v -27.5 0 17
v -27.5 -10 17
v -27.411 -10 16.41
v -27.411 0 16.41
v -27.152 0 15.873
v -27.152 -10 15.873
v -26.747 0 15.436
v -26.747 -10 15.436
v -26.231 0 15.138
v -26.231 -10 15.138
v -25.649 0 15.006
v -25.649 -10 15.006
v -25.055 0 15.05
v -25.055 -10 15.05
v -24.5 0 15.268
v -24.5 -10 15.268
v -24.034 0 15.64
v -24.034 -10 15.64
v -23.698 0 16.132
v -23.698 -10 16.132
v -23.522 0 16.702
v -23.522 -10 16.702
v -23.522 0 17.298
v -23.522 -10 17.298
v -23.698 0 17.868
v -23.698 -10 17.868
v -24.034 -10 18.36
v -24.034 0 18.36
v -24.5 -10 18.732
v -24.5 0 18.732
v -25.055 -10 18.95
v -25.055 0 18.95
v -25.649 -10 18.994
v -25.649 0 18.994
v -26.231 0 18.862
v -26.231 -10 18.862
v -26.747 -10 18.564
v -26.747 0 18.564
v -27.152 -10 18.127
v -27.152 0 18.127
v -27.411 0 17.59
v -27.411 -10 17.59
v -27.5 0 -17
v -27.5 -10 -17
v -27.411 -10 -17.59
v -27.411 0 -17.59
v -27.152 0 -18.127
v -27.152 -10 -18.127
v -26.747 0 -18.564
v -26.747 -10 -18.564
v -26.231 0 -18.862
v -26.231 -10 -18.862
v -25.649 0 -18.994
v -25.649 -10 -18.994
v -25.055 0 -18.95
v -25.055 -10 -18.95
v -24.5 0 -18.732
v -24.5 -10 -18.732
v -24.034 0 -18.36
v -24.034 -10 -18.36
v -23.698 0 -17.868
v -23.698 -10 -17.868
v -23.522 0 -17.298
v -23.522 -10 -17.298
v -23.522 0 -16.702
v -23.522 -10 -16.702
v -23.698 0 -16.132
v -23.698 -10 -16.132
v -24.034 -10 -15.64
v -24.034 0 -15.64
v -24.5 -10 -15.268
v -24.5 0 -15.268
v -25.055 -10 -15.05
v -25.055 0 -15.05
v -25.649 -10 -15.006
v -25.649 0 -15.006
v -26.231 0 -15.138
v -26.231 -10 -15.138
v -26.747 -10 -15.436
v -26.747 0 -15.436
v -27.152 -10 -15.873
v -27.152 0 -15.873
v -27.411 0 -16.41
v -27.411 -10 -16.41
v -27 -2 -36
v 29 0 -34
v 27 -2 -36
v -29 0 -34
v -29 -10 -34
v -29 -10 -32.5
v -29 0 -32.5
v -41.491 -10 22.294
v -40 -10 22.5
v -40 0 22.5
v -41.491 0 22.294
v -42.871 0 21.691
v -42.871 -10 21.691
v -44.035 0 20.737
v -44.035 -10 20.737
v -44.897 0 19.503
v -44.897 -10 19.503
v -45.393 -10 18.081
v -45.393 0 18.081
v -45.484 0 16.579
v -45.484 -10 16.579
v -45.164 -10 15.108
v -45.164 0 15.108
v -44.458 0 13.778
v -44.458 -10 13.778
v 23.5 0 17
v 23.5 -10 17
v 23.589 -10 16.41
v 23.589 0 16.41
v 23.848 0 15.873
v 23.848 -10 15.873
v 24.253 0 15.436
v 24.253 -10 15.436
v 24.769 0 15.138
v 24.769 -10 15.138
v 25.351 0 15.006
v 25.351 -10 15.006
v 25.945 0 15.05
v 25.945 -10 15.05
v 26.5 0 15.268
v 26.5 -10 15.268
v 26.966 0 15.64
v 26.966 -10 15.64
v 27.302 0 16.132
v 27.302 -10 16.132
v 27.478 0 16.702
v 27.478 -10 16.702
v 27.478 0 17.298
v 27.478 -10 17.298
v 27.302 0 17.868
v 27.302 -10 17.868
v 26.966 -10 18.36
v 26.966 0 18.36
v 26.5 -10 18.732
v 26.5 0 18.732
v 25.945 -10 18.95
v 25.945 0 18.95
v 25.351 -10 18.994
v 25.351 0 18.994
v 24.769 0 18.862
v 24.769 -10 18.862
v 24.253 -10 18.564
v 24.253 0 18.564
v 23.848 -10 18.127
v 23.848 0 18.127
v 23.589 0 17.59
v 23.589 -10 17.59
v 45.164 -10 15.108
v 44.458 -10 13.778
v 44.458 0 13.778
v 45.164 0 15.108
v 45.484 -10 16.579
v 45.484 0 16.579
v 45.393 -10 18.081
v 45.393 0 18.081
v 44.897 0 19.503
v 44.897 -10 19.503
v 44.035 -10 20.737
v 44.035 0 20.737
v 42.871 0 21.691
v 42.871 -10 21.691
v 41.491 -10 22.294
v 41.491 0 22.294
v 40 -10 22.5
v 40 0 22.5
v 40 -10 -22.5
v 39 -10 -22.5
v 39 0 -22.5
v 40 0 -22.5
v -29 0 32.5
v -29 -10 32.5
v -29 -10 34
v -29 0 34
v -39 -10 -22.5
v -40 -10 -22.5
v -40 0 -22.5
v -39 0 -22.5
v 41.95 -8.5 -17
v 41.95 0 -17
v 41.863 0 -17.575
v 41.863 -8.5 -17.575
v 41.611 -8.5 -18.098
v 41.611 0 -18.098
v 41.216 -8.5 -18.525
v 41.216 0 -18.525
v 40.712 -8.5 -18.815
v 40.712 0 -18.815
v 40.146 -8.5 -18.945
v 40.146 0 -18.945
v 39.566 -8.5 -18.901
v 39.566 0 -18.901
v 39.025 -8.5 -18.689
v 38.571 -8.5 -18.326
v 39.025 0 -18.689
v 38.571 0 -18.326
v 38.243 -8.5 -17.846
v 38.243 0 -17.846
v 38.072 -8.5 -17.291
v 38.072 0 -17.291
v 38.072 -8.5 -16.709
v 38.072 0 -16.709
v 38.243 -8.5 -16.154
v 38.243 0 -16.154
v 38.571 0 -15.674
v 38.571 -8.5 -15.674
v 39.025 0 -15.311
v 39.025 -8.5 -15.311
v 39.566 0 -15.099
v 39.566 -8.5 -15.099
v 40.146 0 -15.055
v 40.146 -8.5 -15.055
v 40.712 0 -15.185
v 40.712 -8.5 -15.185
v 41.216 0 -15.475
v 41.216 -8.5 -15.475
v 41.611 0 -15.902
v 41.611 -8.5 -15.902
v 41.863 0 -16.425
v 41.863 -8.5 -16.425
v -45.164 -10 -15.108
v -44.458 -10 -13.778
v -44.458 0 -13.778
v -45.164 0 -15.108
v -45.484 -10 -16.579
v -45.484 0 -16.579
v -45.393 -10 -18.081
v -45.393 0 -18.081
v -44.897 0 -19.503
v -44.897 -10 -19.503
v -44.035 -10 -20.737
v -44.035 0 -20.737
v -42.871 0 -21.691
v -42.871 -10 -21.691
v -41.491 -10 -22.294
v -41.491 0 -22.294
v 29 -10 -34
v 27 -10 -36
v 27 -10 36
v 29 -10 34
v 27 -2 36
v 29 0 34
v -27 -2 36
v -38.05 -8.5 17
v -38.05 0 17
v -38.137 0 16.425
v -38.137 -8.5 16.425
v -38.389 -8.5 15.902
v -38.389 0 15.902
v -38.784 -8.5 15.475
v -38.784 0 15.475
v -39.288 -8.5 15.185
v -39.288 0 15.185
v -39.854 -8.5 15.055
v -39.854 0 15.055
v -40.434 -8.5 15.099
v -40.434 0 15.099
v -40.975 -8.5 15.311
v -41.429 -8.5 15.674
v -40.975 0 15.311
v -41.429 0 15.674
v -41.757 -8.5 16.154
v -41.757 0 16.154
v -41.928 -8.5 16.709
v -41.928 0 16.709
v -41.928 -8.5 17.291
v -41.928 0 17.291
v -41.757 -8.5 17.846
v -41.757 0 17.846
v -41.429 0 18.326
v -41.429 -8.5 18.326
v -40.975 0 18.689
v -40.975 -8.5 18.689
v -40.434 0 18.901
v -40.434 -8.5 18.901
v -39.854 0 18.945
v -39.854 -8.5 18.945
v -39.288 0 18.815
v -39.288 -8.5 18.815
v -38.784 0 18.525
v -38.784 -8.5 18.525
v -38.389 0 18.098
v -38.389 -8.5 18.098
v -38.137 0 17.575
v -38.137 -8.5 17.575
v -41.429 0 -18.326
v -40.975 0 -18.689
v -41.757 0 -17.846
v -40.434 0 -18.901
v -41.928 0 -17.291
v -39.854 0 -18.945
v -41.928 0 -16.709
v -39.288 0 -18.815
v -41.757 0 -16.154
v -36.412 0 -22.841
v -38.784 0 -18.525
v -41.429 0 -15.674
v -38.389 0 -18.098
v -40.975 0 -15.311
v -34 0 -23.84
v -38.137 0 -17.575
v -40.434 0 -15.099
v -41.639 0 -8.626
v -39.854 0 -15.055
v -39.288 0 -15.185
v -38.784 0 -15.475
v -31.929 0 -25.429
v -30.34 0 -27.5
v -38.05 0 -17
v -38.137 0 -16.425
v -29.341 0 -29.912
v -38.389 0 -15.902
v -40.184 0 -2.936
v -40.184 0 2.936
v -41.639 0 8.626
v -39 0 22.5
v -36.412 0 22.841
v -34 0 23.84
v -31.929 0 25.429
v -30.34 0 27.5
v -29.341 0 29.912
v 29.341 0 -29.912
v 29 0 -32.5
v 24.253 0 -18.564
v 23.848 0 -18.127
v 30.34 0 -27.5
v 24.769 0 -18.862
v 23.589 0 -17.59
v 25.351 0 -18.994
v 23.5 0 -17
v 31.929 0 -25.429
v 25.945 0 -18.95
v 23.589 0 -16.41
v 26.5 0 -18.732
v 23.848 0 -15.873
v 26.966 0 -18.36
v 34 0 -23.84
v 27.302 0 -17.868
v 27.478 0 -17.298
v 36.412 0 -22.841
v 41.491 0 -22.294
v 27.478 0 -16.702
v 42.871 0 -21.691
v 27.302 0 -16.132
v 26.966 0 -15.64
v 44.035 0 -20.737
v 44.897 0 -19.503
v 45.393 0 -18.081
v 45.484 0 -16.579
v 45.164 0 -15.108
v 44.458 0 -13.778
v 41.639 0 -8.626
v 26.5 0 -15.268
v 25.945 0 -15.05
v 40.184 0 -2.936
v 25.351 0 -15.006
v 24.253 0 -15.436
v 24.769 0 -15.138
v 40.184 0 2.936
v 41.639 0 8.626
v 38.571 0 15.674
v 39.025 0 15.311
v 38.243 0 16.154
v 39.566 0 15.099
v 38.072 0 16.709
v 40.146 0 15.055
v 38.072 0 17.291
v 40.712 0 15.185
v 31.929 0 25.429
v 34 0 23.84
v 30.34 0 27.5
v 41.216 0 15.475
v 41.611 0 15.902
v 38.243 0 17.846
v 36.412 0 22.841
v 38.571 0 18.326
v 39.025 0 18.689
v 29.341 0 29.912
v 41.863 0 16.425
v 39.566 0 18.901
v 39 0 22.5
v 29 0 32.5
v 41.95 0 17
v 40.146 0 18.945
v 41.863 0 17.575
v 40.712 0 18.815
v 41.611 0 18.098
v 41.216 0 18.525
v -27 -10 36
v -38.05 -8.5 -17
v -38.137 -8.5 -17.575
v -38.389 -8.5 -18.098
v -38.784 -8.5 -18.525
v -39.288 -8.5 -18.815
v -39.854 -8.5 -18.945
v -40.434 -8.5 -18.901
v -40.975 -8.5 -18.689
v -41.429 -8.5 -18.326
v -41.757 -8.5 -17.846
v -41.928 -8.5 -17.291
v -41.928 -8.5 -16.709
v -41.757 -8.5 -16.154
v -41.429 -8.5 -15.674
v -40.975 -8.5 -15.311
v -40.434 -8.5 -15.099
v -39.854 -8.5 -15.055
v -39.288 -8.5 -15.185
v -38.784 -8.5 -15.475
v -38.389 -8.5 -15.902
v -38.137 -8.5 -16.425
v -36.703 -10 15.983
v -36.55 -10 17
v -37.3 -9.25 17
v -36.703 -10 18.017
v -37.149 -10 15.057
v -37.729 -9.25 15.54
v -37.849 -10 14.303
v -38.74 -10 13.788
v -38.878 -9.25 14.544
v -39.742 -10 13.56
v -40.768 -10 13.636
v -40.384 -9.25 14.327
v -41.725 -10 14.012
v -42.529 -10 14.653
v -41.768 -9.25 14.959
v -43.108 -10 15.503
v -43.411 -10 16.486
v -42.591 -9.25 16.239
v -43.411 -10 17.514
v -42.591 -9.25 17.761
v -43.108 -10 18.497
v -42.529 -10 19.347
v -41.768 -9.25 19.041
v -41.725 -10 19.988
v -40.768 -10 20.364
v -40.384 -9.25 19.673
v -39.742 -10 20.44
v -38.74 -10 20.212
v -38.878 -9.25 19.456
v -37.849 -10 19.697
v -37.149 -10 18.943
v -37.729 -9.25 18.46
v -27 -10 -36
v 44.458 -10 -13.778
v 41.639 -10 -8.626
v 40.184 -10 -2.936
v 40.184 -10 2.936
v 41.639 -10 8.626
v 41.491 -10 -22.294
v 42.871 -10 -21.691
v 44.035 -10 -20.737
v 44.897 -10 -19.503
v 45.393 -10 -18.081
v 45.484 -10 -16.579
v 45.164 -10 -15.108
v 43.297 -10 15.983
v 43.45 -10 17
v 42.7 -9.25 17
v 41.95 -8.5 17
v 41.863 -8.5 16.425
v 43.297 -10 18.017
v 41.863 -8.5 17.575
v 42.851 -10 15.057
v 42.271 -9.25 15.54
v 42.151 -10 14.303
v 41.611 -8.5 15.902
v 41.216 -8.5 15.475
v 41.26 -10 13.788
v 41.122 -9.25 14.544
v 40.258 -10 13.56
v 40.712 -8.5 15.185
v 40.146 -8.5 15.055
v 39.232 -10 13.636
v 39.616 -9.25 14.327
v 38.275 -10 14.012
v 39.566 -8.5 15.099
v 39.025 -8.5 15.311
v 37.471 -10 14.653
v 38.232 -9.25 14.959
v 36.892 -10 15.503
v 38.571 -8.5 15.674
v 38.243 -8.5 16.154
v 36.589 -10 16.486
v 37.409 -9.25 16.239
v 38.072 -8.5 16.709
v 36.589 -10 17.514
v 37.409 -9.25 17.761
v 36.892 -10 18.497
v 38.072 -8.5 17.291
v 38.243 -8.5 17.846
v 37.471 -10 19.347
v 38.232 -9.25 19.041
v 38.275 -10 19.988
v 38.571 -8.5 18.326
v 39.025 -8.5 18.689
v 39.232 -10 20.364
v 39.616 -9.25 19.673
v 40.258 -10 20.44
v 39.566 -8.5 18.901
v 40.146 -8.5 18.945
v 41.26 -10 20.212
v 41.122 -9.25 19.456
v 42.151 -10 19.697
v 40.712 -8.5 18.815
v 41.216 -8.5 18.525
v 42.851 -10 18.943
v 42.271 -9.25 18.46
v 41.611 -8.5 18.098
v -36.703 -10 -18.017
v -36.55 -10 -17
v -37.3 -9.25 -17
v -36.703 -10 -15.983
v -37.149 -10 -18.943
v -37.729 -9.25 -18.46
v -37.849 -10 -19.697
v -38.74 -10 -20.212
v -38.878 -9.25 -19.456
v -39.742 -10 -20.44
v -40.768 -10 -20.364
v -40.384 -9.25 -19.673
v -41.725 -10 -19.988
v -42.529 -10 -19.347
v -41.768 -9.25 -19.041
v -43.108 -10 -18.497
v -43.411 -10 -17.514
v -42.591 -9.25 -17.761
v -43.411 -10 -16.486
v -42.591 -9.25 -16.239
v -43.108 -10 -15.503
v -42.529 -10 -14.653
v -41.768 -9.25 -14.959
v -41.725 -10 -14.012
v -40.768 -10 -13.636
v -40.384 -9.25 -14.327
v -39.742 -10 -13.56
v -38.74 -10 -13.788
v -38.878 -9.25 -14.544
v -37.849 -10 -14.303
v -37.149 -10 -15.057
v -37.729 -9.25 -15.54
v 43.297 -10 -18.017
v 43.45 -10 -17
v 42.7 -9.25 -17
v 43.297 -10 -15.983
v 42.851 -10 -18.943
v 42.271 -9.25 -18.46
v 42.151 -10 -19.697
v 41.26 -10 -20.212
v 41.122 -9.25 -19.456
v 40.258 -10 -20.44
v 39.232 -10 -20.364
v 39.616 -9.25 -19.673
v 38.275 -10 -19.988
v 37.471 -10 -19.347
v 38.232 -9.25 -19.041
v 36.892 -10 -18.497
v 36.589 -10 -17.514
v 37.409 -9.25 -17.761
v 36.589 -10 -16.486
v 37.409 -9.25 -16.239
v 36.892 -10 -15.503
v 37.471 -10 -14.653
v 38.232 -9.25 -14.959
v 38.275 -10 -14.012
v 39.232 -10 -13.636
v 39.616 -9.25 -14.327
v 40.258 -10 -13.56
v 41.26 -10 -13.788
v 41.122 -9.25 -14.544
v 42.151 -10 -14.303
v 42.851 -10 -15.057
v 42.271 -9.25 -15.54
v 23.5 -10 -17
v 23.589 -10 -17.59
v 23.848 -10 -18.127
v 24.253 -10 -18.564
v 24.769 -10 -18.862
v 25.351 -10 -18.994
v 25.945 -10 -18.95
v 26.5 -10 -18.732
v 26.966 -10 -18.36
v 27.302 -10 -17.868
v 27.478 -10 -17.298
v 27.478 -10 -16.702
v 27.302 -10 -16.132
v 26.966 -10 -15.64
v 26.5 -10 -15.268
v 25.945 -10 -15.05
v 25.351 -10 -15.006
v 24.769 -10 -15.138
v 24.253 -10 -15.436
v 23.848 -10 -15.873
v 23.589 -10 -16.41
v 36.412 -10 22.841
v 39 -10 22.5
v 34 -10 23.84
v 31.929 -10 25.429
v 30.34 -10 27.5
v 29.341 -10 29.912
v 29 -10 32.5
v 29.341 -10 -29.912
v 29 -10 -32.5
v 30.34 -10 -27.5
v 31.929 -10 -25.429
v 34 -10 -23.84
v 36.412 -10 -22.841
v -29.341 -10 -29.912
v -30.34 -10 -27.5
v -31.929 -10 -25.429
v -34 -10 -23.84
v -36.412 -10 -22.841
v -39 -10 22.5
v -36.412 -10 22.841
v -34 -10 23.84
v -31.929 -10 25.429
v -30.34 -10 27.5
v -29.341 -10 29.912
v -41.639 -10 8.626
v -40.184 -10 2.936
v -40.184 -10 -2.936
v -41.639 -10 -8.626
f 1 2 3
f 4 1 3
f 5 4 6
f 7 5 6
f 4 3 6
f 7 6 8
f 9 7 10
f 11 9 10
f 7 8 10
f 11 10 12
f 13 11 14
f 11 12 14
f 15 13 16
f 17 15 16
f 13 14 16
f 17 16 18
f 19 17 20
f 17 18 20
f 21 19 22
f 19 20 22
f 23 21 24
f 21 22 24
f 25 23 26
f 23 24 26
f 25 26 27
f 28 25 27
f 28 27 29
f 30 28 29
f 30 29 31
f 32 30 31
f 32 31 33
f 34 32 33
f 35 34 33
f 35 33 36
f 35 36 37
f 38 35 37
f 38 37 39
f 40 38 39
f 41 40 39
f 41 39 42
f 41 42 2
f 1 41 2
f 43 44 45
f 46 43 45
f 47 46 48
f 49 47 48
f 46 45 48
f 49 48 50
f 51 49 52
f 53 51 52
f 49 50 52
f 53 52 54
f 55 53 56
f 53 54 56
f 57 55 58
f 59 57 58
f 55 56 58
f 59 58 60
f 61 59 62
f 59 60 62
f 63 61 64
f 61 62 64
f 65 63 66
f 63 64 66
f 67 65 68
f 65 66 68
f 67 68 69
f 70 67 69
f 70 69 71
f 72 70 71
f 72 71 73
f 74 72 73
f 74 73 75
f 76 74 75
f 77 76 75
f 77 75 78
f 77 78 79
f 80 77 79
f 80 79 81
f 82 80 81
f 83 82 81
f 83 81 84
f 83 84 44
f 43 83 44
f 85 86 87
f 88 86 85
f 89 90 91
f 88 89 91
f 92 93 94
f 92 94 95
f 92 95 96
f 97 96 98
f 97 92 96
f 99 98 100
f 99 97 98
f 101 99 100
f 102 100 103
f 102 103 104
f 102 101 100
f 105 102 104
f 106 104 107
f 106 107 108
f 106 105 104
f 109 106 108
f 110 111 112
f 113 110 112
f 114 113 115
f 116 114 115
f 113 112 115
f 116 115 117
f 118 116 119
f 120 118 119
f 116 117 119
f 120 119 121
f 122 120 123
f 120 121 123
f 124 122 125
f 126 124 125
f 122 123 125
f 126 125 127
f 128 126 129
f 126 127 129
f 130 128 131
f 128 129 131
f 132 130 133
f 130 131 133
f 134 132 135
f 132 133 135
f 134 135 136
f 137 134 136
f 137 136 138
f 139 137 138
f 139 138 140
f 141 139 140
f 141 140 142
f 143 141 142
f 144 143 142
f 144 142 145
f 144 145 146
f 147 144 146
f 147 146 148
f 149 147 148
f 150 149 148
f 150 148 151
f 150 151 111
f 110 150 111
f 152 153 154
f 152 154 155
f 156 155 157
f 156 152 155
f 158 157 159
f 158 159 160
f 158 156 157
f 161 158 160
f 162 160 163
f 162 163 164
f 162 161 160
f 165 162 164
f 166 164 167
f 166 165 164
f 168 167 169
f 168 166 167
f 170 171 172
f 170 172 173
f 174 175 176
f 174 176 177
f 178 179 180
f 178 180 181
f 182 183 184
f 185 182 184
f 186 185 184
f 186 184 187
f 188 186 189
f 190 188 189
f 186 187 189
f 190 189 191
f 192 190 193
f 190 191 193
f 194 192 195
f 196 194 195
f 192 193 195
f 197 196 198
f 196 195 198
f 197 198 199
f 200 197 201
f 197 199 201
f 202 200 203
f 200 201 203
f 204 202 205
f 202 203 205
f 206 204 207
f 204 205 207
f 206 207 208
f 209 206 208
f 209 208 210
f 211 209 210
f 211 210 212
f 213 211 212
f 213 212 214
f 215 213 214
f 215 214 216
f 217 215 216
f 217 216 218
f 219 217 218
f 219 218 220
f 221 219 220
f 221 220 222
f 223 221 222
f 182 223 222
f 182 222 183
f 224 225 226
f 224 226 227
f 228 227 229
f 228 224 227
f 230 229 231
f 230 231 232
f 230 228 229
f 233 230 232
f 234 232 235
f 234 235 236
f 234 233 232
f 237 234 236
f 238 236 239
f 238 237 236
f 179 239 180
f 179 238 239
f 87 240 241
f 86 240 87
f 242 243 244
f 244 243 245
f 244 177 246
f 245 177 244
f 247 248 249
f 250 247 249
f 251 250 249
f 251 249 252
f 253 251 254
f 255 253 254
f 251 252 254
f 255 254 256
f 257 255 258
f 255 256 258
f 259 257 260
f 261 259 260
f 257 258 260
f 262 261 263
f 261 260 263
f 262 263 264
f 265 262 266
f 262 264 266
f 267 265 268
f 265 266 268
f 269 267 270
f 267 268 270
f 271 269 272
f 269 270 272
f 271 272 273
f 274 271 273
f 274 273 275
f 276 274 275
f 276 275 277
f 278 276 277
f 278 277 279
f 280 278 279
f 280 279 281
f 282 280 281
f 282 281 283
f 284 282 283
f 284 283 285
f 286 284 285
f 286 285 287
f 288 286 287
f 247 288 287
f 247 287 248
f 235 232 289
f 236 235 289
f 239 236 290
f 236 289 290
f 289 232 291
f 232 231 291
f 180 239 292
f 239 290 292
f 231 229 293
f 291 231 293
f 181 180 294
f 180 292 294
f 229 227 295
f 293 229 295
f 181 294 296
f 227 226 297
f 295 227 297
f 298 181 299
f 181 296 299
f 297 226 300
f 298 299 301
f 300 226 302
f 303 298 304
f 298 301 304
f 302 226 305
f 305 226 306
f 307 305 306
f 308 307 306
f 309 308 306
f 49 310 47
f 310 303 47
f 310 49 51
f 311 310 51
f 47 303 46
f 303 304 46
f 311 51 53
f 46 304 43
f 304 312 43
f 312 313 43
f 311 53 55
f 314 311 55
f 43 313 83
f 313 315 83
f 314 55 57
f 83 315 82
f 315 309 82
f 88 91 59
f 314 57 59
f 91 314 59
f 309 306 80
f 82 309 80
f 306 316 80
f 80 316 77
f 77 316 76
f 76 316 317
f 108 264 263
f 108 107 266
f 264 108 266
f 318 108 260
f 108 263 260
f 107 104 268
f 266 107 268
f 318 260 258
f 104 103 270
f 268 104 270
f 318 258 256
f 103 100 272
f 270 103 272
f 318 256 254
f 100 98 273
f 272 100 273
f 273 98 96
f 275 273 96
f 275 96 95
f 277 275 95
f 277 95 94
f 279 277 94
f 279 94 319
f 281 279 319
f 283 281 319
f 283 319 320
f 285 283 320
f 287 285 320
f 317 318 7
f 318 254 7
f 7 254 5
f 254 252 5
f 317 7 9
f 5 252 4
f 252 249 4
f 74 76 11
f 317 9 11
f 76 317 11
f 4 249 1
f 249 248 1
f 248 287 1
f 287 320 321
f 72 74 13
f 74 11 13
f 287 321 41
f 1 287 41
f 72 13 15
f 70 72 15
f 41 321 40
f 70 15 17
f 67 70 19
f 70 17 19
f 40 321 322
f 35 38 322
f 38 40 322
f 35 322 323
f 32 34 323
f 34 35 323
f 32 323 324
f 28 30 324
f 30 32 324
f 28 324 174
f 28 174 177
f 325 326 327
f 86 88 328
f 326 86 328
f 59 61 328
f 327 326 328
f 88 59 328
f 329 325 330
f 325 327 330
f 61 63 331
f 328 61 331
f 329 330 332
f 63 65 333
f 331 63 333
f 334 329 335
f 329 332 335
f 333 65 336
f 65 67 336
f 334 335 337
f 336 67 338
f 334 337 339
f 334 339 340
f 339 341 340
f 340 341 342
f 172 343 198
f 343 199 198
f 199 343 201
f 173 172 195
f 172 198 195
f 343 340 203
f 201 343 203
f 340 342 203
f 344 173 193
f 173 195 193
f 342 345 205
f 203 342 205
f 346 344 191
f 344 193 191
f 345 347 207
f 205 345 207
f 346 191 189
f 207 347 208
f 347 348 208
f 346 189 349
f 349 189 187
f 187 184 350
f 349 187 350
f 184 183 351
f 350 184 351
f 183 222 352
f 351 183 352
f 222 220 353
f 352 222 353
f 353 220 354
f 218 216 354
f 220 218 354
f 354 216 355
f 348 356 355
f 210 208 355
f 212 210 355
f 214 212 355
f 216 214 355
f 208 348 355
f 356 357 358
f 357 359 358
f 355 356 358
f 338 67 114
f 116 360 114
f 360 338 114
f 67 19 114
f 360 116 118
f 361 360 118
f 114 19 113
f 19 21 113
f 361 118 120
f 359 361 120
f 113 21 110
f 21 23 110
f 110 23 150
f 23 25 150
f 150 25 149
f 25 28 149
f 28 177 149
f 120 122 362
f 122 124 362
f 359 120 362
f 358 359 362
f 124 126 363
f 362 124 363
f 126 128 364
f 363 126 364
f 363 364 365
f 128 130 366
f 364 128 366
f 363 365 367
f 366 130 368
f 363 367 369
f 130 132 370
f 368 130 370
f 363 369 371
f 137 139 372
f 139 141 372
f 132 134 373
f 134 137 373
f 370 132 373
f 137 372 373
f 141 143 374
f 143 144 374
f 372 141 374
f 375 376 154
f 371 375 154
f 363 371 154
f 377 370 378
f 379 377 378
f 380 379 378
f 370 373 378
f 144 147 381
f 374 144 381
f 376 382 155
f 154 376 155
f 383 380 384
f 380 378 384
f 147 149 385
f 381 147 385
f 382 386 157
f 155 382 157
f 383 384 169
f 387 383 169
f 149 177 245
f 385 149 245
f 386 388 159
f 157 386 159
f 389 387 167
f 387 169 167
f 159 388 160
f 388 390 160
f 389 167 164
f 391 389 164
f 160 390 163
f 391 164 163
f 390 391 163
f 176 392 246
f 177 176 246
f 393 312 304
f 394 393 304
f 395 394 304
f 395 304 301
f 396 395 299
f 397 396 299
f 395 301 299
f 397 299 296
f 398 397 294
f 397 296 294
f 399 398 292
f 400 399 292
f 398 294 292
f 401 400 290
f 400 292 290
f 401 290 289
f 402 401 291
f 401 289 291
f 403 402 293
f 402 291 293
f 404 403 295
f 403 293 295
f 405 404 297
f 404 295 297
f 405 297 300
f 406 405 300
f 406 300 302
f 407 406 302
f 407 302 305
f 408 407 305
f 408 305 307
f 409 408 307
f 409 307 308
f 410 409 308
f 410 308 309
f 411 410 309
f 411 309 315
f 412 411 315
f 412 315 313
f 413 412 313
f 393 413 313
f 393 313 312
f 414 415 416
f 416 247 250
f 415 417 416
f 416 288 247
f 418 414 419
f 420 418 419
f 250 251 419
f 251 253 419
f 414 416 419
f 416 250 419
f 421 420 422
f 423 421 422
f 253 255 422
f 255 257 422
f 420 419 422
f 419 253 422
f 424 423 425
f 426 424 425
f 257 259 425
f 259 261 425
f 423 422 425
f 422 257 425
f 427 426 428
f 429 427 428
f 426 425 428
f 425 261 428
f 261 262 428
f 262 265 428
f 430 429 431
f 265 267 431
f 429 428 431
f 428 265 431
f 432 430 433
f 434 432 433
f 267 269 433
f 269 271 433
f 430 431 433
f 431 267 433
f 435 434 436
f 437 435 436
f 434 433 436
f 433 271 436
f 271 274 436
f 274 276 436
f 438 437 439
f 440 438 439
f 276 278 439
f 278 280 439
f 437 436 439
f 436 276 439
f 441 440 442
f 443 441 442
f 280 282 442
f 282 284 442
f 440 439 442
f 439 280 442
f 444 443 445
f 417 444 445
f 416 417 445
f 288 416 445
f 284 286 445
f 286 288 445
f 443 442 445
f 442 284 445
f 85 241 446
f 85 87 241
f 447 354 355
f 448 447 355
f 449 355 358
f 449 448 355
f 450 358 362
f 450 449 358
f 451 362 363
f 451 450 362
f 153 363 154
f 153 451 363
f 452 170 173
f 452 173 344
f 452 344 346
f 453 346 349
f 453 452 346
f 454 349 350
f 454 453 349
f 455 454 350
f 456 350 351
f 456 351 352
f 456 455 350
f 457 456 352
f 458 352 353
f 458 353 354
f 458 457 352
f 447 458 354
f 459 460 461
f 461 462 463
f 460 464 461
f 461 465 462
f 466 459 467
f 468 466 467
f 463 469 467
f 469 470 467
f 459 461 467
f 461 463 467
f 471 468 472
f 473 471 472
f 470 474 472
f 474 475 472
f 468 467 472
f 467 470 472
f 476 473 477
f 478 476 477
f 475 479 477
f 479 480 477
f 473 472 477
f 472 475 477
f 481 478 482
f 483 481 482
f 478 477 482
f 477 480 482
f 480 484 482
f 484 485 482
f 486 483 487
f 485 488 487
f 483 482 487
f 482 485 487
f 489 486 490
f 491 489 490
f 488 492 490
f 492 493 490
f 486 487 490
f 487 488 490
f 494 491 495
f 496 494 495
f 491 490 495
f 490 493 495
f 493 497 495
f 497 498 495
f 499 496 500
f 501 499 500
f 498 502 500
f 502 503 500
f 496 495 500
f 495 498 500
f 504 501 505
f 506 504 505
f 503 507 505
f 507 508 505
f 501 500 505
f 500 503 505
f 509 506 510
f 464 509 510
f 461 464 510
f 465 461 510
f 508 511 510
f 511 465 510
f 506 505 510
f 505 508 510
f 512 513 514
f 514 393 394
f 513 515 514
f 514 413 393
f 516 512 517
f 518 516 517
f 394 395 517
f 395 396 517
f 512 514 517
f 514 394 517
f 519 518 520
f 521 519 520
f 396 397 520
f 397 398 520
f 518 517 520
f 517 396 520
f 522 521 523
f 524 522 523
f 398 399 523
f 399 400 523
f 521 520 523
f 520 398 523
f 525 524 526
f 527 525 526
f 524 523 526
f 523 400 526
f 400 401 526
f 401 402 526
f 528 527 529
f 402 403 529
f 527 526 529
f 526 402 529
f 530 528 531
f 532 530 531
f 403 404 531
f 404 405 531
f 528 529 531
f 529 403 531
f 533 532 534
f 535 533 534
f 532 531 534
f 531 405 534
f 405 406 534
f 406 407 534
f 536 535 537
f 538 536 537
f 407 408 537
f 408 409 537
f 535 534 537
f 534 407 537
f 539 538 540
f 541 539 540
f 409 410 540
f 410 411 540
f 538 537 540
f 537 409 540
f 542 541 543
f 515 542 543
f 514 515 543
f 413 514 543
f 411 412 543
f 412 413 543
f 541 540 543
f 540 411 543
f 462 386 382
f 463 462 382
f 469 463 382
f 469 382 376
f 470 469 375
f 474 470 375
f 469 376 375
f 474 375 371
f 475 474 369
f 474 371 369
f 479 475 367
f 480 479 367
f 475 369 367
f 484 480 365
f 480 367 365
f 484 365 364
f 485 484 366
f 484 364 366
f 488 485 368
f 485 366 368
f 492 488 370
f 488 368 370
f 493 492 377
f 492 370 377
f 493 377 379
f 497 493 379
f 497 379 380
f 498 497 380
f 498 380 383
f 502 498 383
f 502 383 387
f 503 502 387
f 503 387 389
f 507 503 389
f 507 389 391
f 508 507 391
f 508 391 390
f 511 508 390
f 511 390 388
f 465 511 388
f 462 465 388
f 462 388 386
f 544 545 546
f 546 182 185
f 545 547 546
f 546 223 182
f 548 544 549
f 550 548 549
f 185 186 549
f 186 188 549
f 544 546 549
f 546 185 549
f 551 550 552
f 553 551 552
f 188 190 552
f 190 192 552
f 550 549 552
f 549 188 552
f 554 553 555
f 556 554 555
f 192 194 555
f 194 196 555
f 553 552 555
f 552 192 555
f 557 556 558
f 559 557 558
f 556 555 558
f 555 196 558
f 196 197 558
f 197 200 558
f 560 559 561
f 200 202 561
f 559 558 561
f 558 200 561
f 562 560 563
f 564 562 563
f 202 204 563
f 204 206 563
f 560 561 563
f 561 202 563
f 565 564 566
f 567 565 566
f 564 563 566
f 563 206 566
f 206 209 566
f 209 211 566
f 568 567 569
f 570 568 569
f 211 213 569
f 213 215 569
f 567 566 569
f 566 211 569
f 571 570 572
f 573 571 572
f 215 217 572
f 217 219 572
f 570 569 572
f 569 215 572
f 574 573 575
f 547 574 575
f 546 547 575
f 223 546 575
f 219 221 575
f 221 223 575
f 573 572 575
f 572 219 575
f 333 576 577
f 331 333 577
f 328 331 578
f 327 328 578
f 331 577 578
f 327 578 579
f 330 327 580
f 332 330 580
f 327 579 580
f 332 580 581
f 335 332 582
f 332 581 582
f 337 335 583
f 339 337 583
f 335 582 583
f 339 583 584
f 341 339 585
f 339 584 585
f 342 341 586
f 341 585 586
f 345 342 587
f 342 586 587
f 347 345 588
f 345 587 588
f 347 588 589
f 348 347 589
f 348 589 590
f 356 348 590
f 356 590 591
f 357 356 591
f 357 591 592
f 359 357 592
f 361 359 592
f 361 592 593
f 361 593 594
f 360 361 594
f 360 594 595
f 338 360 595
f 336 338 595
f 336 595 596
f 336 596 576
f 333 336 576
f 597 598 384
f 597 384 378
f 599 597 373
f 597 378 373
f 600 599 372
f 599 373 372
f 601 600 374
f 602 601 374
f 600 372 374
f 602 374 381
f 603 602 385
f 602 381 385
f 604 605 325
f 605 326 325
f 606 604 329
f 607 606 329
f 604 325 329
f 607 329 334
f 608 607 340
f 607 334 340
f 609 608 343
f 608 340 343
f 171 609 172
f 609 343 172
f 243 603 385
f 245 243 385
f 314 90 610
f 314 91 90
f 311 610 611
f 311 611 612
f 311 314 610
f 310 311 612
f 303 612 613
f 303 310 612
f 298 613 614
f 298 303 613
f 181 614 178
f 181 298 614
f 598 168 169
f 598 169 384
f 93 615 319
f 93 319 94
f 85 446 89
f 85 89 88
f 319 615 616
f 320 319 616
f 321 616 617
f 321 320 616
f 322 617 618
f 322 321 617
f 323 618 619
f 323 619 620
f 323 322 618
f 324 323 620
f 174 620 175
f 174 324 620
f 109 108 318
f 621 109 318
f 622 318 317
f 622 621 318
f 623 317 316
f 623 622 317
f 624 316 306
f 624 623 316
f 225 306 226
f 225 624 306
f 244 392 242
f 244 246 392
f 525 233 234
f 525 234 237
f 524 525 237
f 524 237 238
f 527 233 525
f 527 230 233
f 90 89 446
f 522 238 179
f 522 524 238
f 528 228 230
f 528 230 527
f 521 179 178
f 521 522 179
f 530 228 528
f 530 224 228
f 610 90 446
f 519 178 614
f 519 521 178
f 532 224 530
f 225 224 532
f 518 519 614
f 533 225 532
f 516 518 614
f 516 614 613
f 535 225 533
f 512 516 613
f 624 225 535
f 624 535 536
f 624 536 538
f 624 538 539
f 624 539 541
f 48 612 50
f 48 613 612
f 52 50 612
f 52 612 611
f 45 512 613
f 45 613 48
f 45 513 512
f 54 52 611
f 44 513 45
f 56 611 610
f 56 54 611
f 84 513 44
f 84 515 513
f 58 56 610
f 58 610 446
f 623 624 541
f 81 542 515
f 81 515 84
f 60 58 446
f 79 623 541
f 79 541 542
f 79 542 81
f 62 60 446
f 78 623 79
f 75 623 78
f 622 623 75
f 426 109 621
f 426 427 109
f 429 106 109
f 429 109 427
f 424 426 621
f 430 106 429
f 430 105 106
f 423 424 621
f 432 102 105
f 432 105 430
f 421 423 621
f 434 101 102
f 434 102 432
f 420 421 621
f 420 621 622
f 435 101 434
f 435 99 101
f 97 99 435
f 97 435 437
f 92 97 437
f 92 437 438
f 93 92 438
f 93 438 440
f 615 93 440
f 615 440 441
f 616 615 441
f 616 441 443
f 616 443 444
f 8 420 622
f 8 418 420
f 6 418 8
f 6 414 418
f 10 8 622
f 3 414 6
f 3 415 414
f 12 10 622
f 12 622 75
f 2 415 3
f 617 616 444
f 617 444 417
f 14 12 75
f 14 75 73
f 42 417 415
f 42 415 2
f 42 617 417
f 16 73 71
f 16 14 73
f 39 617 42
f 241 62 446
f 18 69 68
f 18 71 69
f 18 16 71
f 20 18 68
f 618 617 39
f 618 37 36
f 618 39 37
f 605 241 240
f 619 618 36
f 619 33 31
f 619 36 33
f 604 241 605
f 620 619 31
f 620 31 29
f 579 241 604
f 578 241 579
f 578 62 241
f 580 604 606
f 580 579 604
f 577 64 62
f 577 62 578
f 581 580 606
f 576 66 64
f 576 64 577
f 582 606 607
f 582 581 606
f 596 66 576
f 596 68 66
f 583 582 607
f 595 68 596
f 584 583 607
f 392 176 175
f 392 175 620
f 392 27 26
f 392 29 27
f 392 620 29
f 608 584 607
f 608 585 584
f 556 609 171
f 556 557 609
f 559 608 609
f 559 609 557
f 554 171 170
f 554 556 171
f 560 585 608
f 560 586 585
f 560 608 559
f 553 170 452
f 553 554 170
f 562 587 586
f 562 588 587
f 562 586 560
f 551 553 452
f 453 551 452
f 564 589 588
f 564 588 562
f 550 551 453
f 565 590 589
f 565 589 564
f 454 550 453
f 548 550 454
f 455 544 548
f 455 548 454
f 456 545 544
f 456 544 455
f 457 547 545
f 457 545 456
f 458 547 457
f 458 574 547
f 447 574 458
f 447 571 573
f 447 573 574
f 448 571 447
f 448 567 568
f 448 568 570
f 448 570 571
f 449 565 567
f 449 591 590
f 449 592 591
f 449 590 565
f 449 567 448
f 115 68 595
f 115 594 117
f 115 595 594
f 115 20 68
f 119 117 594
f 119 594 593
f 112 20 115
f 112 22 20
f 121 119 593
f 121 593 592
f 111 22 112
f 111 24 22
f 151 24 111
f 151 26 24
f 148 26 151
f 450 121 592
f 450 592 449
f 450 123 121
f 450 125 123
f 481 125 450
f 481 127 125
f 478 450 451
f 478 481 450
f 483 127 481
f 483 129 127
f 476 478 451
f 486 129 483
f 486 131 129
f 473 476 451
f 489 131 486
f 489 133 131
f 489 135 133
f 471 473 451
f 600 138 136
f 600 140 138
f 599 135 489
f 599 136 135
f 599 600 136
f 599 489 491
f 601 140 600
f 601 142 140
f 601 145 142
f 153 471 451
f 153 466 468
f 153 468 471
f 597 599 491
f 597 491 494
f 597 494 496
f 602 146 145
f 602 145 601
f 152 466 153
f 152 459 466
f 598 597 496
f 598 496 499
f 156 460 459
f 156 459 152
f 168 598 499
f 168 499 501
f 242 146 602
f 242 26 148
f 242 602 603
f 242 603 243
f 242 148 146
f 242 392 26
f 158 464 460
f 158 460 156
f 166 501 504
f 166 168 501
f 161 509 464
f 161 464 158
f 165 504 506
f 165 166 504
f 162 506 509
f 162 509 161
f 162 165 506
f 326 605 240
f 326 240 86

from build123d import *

# Parameters (mm, degrees)
BOSS_EXTRUDE1_DEPTH        = 10
SKETCH2_W                  = 58
SKETCH2_H                  = 10
BOSS_EXTRUDE2_DEPTH        = 13.5
SKETCH3_W                  = 58
SKETCH3_H                  = 10
BOSS_EXTRUDE3_DEPTH        = 13.5
F_4_0_4_DIAMETER_HOLE1_D   = 4
F_3_9_3_9_DIAMETER_HOLE1_D = 3.9
CHAMFER1_SIZE              = 1.5
CHAMFER2_SIZE              = 2
FILLET1_R                  = 10


with BuildPart() as part:
    # Sketch1 → Boss-Extrude1 (new body)
    with BuildSketch(Plane.XZ.offset(10)):
        with BuildLine():
            Line((-40, -22.5), (40, -22.5))
            ThreePointArc((40, -22.5), (44.897390752, -19.503110829), (44.457713391, -13.778386844))
            ThreePointArc((44.457713391, -13.778386844), (40, 0), (44.457713391, 13.778386844))
            ThreePointArc((44.457713391, 13.778386844), (44.897390752, 19.503110829), (40, 22.5))
            Line((40, 22.5), (-40, 22.5))
            ThreePointArc((-40, 22.5), (-44.897390752, 19.503110829), (-44.457713391, 13.778386844))
            ThreePointArc((-44.457713391, 13.778386844), (-40, 0), (-44.457713391, -13.778386844))
            ThreePointArc((-44.457713391, -13.778386844), (-44.897390752, -19.503110829), (-40, -22.5))
        make_face()
    extrude(amount=-BOSS_EXTRUDE1_DEPTH)

    # Sketch2 → Boss-Extrude2 (add)
    with BuildSketch(Plane(origin=(0, 0, -22.5), x_dir=(-1, 0, 0), z_dir=(0, 0, -1))):
        with Locations((0, -5)):
            Rectangle(SKETCH2_W, SKETCH2_H)
    extrude(amount=BOSS_EXTRUDE2_DEPTH)

    # Sketch3 → Boss-Extrude3 (add)
    with BuildSketch(Plane.XY.offset(22.5)):
        with Locations((0, -5)):
            Rectangle(SKETCH3_W, SKETCH3_H)
    extrude(amount=BOSS_EXTRUDE3_DEPTH)

    # Ø4.0 (4) Diameter Hole1 (through all)
    with Locations(Plane(origin=(0, 0, 0), x_dir=(1, 0, 0), z_dir=(0, 1, 0))):
        with Locations((-25.5, -17), (-25.5, 17), (25.5, 17), (25.5, -17)):
            Hole(F_4_0_4_DIAMETER_HOLE1_D / 2)

    # Ø3.9 (3.9) Diameter Hole1 (through all)
    with Locations(Plane(origin=(0, -10, 0), x_dir=(-1, 0, 0), z_dir=(0, -1, 0))):
        with Locations((40, 17), (-40, 17), (-40, -17), (40, -17)):
            Hole(F_3_9_3_9_DIAMETER_HOLE1_D / 2)

    # Chamfer1
    chamfer1_edges = [part.edges().sort_by_distance(p)[0] for p in [
        (-41.95, -10, 17),
        (38.05, -10, 17),
        (38.05, -10, -17),
        (-41.95, -10, -17),
    ]]
    chamfer(chamfer1_edges, length=CHAMFER1_SIZE)

    # Chamfer2
    chamfer2_edges = [part.edges().sort_by_distance(p)[0] for p in [
        (-29, -5, -36),
        (0, 0, -36),
        (29, -5, -36),
        (29, -5, 36),
        (0, 0, 36),
        (-29, -5, 36),
    ]]
    chamfer(chamfer2_edges, length=CHAMFER2_SIZE)

    # Fillet1
    fillet1_edges = [part.edges().sort_by_distance(p)[0] for p in [
        (-29, -5, -22.5),
        (29, -5, -22.5),
        (29, -5, 22.5),
        (-29, -5, 22.5),
    ]]
    fillet(fillet1_edges, radius=FILLET1_R)


solid = part.part
